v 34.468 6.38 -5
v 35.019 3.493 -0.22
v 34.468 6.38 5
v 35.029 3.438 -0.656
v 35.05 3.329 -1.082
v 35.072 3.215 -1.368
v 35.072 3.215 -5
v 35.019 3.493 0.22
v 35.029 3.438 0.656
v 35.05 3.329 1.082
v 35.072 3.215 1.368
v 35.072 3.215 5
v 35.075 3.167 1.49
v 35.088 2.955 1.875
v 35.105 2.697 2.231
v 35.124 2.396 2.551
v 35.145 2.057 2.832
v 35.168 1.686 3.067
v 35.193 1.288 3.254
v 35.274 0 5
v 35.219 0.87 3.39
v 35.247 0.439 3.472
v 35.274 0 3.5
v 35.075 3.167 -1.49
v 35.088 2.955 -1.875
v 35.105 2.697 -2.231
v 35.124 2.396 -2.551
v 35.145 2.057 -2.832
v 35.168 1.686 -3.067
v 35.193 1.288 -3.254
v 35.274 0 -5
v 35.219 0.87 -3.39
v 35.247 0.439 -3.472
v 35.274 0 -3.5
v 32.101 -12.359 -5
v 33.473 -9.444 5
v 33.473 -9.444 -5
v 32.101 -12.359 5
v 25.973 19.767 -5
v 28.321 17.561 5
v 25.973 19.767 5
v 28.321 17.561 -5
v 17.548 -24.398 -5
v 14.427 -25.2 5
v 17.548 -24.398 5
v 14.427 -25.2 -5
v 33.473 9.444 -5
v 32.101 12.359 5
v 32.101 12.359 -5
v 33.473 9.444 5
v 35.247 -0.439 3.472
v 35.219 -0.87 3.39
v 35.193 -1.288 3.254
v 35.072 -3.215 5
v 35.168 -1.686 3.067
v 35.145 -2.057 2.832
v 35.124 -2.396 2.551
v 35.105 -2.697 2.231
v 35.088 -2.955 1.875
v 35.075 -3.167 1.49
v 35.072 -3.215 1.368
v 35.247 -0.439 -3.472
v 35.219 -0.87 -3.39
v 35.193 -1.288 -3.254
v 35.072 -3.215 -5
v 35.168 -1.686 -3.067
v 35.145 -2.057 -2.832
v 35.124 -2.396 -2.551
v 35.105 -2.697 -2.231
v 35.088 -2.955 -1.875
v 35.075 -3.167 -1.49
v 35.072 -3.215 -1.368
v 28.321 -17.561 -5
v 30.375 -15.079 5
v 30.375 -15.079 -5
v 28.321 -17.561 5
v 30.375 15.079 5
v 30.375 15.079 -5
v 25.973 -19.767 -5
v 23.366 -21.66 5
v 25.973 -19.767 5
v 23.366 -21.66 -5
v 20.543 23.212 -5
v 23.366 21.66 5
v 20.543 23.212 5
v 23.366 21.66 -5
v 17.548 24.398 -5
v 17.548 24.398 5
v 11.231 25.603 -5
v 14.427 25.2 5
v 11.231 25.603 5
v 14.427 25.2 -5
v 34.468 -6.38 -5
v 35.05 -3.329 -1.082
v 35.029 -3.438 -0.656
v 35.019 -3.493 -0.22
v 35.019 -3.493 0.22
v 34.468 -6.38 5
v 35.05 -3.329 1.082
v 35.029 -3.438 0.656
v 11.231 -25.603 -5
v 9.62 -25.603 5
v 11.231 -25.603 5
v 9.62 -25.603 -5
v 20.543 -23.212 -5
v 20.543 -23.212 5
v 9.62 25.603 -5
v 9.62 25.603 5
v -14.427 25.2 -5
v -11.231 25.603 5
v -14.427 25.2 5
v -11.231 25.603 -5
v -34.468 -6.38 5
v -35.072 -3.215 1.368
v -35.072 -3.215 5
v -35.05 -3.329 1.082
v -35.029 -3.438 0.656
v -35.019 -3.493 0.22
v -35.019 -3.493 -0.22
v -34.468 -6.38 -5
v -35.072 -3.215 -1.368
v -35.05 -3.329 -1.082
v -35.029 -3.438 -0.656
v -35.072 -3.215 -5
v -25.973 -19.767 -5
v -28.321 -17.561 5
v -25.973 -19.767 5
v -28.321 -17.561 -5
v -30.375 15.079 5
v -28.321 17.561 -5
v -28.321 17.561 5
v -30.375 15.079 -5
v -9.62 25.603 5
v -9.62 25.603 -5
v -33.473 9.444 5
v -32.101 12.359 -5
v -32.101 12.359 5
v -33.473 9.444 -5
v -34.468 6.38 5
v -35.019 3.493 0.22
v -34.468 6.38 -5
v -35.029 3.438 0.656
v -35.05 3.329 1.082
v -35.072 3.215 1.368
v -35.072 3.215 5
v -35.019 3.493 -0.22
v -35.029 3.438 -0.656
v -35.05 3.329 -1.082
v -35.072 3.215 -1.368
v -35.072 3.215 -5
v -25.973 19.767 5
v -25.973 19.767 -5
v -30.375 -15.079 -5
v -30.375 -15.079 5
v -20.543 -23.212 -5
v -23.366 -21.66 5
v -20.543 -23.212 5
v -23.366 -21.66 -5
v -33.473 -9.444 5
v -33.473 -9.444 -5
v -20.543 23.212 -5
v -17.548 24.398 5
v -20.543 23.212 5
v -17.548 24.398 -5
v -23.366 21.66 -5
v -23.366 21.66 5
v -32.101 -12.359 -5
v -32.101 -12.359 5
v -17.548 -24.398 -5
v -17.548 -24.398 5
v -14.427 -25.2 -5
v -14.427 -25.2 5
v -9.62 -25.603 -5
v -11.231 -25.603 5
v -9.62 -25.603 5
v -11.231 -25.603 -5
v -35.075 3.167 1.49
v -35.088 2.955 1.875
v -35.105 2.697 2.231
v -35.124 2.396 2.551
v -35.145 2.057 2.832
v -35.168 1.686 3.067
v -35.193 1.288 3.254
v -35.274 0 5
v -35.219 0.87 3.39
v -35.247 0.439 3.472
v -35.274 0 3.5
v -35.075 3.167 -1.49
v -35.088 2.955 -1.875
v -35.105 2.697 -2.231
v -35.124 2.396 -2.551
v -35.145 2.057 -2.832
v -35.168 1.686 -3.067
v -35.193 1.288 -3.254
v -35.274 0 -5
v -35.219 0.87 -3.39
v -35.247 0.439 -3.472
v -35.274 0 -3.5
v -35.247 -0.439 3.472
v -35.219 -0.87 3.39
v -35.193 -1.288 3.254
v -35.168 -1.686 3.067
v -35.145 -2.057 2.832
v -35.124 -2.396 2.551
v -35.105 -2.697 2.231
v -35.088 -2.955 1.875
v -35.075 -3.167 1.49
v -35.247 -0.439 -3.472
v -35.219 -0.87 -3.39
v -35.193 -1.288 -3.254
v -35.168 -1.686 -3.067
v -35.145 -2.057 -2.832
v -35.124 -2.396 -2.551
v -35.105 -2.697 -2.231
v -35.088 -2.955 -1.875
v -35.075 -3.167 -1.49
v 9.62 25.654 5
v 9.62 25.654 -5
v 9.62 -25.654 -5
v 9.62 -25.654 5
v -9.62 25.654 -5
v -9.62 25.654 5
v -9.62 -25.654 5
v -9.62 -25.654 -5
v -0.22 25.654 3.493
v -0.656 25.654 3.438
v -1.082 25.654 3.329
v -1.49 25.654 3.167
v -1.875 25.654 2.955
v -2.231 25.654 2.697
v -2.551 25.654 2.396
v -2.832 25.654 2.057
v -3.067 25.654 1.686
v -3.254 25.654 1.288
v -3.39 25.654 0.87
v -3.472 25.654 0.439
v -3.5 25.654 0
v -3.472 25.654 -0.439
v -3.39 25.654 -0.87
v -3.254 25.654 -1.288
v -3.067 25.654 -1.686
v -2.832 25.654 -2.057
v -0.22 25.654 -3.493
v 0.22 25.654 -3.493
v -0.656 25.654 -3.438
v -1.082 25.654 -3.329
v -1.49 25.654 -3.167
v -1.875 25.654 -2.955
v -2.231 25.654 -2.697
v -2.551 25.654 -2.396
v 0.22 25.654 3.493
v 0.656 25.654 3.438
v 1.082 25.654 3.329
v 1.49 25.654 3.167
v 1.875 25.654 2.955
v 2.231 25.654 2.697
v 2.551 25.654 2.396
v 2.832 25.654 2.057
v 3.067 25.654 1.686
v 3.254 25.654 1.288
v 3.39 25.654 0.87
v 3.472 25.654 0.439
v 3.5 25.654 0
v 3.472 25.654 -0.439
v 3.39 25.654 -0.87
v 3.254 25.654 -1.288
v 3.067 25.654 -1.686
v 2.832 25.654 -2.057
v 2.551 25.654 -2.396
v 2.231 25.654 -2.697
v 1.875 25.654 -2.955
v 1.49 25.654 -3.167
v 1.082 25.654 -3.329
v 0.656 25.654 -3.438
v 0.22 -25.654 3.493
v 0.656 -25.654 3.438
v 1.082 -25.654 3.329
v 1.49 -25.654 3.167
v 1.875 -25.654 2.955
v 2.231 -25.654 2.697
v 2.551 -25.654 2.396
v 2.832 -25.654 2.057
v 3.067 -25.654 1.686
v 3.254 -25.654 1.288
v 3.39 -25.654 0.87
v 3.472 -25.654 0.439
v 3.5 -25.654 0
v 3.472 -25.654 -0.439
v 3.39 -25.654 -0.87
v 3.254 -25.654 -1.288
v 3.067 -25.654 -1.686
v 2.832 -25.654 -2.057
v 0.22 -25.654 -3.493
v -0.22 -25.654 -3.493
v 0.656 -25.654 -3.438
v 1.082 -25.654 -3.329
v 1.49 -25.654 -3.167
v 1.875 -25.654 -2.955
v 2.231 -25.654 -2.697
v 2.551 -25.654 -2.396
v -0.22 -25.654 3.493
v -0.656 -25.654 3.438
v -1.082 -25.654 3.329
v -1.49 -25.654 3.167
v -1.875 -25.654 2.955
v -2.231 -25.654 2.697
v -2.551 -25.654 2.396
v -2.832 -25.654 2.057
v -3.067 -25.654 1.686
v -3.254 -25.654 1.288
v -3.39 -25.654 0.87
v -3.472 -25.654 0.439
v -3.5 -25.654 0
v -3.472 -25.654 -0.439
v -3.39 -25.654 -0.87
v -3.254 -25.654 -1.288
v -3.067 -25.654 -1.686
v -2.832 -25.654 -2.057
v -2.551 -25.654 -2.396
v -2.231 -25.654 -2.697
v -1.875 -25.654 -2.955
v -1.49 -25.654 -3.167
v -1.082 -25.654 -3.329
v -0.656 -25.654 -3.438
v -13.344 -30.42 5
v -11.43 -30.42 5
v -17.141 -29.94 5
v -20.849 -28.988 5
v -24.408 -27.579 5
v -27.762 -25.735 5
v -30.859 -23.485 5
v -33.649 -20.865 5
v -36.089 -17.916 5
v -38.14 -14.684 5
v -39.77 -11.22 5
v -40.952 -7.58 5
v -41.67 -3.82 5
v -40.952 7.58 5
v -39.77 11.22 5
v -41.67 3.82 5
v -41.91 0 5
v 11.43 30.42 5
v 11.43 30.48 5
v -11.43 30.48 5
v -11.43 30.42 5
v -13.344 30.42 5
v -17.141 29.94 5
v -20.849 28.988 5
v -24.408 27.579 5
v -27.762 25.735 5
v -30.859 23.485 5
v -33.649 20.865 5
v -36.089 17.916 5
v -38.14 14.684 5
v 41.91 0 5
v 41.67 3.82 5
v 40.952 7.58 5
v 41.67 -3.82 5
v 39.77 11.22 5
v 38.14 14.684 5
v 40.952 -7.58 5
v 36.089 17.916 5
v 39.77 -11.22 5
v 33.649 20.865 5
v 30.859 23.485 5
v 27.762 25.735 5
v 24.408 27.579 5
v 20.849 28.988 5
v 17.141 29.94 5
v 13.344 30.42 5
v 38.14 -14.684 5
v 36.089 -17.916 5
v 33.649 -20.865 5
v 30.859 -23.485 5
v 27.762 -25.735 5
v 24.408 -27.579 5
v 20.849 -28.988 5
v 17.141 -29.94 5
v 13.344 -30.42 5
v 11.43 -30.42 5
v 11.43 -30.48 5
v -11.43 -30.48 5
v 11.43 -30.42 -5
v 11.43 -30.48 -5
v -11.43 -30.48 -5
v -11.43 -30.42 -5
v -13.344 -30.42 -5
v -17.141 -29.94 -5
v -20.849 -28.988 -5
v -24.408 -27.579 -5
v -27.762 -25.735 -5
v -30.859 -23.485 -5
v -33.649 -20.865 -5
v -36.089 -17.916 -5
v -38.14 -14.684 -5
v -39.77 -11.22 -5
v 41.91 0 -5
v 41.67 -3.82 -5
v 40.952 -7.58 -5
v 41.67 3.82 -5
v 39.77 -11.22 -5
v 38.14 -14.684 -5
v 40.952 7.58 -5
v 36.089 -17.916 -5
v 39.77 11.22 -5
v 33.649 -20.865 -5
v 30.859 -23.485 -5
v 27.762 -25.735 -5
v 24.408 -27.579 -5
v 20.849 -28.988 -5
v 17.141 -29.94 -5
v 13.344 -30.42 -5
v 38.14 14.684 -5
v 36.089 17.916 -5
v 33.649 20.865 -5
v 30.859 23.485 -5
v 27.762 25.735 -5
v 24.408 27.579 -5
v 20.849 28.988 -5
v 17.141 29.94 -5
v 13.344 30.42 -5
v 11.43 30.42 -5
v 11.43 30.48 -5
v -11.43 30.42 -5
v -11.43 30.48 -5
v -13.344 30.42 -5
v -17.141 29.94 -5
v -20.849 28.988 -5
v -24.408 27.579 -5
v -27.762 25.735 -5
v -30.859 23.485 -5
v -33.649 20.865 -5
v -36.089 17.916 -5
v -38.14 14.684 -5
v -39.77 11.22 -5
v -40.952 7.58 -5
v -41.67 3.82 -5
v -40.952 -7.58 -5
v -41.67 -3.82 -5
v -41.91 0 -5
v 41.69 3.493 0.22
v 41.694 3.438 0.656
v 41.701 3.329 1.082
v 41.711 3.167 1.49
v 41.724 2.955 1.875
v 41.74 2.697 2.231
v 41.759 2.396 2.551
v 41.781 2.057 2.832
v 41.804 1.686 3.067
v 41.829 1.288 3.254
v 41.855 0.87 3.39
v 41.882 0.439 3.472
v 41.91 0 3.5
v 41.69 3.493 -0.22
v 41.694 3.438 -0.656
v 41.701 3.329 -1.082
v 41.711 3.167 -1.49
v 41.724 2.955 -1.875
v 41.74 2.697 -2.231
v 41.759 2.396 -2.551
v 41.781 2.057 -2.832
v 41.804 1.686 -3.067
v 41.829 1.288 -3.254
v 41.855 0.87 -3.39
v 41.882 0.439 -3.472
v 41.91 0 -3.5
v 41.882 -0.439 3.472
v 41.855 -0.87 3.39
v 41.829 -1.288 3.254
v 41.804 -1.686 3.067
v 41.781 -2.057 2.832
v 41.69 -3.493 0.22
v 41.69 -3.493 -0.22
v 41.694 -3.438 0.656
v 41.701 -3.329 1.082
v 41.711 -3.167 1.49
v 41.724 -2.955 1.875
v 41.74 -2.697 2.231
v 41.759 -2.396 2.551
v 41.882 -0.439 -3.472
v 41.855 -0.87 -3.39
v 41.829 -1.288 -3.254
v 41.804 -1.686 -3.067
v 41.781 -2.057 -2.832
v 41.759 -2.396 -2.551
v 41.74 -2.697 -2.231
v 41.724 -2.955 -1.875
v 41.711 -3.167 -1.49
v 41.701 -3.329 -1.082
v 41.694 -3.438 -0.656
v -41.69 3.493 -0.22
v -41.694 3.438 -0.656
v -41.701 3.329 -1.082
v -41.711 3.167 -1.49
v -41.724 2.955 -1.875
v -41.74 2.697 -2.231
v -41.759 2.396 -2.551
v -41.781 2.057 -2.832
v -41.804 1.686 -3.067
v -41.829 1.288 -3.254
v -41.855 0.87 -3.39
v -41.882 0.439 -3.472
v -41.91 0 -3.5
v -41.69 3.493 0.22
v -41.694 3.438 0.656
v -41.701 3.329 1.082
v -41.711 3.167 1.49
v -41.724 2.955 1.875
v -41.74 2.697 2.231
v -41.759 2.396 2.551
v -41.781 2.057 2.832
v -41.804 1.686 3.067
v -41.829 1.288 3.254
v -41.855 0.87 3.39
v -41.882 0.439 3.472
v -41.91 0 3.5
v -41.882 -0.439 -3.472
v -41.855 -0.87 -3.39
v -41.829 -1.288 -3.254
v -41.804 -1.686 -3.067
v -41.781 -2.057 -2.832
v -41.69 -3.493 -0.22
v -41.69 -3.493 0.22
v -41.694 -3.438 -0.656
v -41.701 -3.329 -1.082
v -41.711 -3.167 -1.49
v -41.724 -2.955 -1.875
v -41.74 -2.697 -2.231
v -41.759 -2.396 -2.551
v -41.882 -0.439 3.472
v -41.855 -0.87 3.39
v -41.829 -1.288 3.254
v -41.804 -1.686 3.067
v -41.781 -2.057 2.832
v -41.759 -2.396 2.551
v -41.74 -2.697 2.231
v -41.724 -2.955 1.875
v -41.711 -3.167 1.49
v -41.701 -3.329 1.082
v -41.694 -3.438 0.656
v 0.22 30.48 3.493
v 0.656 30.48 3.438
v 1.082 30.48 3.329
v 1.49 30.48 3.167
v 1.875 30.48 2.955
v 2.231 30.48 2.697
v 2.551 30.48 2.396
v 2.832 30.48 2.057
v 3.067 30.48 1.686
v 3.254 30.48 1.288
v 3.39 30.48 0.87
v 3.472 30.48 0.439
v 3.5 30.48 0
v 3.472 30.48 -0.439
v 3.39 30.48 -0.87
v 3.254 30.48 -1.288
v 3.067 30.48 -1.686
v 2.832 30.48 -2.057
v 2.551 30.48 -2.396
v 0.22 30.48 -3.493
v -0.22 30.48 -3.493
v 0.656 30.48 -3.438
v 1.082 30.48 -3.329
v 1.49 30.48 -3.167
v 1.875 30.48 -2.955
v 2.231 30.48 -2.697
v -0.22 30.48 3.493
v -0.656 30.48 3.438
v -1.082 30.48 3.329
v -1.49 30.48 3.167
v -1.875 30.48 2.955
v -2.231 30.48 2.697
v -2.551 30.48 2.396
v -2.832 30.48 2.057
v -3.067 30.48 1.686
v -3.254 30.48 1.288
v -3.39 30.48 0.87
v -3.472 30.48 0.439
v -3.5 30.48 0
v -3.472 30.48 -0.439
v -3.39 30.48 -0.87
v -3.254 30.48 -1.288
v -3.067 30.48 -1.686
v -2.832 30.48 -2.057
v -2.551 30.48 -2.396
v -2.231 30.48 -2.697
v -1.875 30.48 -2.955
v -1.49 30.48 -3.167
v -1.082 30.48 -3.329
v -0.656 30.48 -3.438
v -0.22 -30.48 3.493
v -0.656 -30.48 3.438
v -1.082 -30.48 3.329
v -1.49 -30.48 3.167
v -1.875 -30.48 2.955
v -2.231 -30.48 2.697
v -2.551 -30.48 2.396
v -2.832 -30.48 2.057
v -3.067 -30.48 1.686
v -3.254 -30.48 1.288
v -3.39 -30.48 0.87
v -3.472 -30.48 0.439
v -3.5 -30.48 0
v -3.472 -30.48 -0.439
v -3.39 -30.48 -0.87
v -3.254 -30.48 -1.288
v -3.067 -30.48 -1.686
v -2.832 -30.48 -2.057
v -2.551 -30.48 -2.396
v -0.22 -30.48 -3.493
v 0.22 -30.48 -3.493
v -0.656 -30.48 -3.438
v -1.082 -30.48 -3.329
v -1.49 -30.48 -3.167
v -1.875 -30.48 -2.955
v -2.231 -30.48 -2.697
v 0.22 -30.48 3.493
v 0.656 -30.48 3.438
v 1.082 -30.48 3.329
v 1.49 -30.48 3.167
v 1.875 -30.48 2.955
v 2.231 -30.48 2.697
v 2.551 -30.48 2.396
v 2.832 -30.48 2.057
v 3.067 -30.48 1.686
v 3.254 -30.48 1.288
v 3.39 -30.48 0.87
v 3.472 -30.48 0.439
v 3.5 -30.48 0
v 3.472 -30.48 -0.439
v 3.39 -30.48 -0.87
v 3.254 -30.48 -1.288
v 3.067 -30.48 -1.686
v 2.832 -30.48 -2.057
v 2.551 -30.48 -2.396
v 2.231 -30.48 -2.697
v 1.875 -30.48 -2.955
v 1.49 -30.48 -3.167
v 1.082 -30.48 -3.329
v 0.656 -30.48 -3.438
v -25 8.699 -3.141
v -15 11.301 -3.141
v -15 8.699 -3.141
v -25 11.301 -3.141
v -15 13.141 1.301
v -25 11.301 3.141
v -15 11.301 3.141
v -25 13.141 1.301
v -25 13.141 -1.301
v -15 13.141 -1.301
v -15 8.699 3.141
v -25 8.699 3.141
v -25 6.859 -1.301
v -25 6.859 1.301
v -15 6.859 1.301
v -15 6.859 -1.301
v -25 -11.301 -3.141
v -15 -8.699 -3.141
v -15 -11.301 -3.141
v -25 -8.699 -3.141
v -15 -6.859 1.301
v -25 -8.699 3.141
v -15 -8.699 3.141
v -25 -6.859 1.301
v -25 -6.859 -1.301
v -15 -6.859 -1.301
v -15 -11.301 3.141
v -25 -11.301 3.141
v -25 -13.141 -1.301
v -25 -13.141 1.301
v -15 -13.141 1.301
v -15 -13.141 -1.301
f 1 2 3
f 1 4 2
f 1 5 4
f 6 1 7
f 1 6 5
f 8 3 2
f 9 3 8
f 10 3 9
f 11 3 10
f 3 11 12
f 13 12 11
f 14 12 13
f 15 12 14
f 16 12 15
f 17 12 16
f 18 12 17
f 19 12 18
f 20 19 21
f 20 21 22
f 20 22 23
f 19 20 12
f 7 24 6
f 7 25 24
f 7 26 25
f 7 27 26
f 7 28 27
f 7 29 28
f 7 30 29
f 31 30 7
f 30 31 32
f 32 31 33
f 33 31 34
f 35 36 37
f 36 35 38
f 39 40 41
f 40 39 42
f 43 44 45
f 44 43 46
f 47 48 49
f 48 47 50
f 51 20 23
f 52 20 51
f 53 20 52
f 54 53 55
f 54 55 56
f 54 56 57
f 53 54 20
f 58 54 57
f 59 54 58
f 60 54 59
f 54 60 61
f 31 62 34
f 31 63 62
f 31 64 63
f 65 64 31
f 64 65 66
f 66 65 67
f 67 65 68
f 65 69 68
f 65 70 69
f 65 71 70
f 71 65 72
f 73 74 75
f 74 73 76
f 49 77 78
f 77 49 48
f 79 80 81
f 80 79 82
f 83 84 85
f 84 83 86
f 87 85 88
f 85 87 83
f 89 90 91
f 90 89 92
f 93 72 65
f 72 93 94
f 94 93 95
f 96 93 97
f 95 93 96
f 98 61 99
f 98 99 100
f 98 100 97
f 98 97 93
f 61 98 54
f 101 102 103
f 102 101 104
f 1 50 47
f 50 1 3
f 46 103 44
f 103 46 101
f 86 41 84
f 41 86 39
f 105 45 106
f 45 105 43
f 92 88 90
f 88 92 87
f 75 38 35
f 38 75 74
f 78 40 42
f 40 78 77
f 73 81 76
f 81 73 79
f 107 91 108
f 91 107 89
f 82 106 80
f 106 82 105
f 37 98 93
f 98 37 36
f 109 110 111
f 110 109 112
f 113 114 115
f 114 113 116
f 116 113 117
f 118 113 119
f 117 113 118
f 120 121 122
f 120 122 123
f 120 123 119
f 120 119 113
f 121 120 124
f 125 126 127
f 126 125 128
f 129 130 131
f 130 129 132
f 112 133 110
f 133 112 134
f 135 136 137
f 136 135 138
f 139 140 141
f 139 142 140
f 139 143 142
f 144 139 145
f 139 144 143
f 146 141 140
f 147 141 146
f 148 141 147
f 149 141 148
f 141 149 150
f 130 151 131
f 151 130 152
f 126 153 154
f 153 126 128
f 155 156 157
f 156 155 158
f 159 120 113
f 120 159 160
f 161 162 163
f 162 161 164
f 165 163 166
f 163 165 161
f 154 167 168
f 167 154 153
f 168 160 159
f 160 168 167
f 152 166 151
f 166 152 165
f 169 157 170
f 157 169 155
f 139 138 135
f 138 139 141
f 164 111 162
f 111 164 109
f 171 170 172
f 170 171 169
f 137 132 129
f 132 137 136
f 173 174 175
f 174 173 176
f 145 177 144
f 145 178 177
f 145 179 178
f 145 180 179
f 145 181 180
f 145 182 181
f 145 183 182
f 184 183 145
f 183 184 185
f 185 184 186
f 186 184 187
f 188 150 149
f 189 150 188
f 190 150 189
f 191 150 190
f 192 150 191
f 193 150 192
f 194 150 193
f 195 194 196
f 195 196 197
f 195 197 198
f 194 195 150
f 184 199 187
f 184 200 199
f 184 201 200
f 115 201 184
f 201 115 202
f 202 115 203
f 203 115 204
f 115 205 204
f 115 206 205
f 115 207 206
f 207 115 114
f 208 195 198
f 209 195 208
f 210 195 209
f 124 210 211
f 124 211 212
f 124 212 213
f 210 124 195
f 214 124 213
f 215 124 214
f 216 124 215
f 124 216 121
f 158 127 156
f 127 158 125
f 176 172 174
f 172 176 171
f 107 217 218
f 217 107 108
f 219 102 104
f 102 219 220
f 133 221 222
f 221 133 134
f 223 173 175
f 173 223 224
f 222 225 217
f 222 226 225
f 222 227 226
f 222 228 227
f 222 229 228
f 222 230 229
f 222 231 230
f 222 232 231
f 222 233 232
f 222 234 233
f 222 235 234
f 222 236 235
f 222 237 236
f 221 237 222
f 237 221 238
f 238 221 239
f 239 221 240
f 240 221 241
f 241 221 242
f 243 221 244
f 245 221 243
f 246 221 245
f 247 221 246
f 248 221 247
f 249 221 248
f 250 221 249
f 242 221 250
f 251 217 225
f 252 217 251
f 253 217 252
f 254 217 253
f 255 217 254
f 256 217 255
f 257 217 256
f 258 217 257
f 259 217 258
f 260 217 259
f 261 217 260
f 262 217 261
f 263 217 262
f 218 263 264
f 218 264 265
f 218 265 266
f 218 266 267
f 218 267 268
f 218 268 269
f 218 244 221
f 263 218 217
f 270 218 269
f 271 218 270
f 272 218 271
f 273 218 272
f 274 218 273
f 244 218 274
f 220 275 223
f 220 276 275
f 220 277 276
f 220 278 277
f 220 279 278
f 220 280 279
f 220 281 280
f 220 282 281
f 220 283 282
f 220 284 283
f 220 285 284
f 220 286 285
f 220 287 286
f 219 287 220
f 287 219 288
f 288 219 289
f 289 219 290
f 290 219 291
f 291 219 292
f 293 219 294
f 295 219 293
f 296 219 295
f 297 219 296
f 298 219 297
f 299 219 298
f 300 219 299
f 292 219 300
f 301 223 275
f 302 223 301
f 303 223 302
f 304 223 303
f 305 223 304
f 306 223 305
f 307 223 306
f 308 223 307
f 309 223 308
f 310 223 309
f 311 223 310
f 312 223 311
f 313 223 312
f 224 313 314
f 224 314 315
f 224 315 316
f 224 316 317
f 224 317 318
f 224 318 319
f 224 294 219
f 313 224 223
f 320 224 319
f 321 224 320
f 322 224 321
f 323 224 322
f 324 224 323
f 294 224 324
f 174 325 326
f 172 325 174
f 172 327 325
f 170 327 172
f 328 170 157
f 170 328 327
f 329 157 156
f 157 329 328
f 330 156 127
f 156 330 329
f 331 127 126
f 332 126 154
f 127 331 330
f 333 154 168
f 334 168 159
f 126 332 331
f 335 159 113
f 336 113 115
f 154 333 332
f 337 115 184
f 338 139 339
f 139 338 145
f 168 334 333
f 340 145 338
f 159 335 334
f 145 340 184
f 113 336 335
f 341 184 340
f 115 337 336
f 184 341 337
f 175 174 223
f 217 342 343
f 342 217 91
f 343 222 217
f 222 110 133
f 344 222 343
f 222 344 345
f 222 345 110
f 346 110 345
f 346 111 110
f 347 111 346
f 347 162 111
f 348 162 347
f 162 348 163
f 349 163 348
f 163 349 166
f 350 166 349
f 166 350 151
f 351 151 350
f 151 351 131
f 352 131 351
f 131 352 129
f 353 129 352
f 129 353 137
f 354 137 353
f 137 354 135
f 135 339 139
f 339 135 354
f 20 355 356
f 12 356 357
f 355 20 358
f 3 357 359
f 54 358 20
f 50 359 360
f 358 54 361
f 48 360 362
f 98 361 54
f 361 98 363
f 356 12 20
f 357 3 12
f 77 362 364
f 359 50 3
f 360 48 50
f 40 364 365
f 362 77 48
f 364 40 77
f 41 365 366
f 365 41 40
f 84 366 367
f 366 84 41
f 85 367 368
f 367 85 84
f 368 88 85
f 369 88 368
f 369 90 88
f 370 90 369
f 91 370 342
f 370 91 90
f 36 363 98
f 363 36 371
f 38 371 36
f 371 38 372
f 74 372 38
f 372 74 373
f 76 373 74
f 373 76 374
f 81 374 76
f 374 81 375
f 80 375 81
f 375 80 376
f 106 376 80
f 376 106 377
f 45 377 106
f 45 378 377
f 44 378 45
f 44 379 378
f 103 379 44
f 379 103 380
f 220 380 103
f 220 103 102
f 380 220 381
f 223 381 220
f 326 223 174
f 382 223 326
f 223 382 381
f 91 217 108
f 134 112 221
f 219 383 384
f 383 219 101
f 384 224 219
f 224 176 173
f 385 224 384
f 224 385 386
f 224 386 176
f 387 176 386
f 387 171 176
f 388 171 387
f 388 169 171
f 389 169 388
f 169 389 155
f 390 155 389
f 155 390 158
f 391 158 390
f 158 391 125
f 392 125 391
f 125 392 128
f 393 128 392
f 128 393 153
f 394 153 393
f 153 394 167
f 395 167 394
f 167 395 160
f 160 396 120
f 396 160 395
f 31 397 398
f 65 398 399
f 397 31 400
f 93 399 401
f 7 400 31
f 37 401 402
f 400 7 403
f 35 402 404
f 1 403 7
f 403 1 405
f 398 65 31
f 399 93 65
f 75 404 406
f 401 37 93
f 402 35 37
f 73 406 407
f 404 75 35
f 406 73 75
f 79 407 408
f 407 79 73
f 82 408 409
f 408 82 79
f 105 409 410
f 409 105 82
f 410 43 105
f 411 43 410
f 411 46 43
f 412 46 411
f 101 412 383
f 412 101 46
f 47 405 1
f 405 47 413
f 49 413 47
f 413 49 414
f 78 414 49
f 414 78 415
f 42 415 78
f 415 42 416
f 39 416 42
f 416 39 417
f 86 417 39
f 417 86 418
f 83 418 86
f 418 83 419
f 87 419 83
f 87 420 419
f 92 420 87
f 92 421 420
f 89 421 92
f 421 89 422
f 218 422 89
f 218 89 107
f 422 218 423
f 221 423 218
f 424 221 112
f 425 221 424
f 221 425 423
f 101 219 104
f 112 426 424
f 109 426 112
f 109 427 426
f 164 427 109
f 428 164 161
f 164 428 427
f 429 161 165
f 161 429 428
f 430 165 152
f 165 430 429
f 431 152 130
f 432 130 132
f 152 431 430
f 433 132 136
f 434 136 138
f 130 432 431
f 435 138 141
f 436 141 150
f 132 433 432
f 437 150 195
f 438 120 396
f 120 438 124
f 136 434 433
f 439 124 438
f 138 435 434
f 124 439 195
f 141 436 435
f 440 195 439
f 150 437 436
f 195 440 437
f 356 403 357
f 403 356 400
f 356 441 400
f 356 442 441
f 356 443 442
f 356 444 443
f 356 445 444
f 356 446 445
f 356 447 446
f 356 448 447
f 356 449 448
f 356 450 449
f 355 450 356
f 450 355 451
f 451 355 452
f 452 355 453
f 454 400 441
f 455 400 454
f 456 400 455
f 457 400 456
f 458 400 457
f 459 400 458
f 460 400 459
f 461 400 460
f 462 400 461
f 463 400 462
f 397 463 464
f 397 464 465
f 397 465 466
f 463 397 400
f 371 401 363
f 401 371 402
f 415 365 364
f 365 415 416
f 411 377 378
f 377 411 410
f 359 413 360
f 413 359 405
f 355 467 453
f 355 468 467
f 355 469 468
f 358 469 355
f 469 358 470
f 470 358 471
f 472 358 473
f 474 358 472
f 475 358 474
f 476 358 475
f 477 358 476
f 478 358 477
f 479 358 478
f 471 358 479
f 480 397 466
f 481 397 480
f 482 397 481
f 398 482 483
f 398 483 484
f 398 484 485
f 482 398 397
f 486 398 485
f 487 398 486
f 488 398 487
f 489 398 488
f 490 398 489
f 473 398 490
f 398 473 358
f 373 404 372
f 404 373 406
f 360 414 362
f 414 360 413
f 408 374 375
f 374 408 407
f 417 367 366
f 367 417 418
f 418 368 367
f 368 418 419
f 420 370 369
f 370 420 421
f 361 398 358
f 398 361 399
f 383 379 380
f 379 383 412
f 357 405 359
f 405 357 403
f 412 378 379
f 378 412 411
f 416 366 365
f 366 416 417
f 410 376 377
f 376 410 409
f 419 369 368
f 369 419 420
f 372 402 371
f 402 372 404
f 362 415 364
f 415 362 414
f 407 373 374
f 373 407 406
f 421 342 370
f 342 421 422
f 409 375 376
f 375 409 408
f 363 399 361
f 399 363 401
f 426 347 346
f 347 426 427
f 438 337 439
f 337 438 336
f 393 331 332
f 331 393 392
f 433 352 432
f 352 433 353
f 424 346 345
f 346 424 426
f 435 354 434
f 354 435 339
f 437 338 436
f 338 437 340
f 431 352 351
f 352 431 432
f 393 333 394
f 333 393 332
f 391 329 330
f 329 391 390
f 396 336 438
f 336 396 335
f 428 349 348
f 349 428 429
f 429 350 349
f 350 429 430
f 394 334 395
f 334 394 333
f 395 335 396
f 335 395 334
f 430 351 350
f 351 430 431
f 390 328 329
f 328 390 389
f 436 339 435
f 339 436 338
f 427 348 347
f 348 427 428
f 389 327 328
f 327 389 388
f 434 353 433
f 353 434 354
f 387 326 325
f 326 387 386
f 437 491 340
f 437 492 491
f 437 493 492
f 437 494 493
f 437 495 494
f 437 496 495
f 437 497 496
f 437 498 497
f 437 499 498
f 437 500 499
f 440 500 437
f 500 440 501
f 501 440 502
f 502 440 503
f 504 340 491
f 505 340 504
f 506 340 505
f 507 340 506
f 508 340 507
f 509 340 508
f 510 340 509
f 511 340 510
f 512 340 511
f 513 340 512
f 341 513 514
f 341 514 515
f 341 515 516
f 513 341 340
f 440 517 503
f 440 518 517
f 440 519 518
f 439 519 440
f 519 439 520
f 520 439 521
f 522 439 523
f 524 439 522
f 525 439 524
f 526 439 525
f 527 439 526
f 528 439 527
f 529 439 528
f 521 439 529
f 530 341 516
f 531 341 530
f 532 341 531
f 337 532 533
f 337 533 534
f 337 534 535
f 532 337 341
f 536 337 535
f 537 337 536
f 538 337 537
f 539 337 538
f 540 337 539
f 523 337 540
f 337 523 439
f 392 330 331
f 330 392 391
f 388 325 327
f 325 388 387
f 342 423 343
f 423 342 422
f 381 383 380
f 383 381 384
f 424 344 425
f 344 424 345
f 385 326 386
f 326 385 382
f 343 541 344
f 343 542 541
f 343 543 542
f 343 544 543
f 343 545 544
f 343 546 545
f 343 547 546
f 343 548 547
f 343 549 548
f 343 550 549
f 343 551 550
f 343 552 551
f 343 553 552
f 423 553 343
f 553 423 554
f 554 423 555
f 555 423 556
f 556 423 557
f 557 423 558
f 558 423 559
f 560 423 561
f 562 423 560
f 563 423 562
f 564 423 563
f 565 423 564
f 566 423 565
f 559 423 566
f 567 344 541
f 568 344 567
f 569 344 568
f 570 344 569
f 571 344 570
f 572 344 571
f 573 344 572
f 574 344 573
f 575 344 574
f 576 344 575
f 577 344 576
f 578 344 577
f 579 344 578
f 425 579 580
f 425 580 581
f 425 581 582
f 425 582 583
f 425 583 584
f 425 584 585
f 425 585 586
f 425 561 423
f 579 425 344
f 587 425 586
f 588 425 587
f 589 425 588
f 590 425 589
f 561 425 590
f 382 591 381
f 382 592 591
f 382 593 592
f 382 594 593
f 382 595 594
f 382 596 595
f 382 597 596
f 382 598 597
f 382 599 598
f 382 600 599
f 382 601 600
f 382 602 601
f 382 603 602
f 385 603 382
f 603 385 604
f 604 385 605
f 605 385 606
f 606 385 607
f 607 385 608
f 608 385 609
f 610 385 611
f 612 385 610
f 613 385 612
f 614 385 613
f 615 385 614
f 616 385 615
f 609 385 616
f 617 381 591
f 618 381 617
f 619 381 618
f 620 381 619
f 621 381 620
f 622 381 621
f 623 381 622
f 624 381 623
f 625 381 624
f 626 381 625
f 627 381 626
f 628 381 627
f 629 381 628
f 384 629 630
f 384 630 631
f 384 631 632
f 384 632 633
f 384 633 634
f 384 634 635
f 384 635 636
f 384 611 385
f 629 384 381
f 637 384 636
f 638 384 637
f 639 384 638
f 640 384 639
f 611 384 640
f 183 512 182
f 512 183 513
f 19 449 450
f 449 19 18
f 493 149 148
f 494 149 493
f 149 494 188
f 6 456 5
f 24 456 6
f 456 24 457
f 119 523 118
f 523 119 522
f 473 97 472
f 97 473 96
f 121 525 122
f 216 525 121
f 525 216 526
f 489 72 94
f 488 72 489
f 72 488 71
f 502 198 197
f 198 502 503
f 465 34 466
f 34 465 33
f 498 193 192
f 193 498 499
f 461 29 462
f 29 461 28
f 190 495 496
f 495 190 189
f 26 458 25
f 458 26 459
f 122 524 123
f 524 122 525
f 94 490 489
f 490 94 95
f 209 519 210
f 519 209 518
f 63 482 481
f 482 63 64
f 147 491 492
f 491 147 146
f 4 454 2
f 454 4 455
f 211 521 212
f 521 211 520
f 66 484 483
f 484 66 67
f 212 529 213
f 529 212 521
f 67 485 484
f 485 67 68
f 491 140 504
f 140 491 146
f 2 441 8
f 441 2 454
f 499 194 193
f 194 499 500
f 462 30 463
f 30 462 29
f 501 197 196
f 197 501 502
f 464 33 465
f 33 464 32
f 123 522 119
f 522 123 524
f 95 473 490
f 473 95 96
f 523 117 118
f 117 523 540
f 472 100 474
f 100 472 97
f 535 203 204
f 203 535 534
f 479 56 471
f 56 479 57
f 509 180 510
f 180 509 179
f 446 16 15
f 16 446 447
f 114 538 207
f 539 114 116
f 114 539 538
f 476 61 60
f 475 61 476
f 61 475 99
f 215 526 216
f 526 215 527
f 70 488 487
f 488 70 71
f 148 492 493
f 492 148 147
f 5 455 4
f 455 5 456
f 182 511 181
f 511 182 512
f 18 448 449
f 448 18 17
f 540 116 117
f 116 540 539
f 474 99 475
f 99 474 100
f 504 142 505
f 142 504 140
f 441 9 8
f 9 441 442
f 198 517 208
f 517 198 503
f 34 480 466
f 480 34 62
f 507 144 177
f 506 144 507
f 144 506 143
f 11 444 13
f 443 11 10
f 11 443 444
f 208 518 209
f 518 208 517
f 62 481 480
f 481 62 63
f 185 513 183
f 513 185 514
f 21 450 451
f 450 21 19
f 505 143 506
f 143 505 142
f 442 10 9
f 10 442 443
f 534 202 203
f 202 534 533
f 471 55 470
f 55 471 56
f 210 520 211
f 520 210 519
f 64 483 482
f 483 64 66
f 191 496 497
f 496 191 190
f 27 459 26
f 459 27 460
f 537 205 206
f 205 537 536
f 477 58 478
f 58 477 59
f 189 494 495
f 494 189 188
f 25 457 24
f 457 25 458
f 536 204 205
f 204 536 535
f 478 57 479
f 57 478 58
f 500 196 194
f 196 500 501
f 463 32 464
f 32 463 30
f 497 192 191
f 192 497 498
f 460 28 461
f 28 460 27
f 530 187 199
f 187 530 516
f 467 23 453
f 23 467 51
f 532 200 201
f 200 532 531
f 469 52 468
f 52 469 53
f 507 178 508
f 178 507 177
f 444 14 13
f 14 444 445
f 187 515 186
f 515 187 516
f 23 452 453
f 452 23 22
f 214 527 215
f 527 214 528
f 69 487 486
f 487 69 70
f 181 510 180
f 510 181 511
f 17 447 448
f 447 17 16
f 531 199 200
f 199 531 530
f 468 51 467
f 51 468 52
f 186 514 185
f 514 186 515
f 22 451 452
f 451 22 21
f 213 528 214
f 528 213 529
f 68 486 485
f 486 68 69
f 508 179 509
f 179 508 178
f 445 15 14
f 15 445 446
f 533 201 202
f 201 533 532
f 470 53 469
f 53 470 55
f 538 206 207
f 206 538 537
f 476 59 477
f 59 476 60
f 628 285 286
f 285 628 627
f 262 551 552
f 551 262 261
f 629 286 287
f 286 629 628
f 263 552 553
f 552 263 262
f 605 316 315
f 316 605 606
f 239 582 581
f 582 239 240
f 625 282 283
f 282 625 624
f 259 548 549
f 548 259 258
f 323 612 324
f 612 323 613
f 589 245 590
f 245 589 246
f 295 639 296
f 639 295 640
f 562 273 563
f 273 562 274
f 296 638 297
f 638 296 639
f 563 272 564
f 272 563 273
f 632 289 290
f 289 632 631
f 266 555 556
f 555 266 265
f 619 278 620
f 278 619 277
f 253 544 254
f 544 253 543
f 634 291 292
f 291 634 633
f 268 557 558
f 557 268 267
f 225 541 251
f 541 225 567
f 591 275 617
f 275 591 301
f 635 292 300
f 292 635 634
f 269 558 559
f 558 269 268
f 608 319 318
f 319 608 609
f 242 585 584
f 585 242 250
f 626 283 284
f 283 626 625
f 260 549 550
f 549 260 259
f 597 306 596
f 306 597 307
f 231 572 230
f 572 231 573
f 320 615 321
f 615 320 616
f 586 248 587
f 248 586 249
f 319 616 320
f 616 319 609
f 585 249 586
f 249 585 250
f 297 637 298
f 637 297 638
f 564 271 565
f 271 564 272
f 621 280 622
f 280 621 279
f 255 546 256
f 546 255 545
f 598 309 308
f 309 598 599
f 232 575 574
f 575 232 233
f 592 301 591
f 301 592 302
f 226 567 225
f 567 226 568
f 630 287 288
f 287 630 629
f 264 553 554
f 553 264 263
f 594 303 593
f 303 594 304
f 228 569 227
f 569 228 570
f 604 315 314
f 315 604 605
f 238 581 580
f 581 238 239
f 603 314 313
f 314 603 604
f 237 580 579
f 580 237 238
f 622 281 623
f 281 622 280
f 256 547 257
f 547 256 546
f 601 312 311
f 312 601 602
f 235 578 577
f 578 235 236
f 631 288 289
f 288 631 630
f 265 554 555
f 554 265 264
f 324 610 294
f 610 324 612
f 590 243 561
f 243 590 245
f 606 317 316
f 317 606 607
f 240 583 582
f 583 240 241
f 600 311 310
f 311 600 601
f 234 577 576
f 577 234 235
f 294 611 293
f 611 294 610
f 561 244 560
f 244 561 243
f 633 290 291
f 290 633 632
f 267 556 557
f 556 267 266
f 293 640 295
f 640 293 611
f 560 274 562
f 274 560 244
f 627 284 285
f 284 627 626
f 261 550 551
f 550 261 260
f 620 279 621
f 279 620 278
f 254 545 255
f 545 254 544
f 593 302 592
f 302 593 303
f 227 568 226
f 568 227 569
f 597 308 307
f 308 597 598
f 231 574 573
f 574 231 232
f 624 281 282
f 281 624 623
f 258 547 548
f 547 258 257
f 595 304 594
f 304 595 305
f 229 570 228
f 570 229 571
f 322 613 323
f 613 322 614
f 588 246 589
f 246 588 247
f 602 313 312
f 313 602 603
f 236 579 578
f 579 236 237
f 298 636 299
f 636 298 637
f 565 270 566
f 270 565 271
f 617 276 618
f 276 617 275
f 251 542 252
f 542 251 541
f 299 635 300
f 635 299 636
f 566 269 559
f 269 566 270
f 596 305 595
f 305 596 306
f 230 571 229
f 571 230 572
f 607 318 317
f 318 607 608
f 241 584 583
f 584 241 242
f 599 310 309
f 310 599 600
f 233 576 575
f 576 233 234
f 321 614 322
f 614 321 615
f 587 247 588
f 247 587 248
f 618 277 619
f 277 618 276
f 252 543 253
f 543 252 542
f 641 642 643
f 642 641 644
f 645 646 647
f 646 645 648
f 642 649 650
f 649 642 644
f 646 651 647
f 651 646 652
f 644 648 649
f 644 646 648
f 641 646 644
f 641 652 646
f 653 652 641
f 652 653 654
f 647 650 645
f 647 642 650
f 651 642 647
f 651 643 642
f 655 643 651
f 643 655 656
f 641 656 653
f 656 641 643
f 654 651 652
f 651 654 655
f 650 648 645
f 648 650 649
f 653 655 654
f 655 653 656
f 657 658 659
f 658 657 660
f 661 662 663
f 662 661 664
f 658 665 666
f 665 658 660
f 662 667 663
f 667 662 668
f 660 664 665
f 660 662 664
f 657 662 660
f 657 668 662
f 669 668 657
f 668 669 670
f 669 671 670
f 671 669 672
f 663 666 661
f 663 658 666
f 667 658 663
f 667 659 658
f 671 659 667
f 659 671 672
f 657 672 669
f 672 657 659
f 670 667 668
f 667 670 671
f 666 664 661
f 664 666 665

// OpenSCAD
/* [PEGS] */
numberPegs = 2; //[0, 1, 2, 3, 4]

// Container is exactly: 2.0" x 2.75"

difference()
{
 ring();
 holes();
}

if (numberPegs > 3)
{ 
    translate([20, 10, 0]) peg();
}
if (numberPegs > 2)
{ 
    translate([20, -10, 0]) peg();
}
if (numberPegs > 1)
{ 
    translate([-20, 10, 0]) peg();
}
if (numberPegs > 0)
{ 
    translate([-20, -10, 0]) peg();
}


module baseCylinder()
{
    cylinder(d=mm(2), h=20, center=true, $fn=50);
}

module container()
{
 translate([mm(.75/2),0,0]) baseCylinder();
 translate([-mm(.75/2),0,0]) baseCylinder();
 cube([mm(0.75), mm(2), 20], center=true);    
}

module ring()
{
intersection()
{
 difference()
 {
  cube([mm(3.5),mm(2.5),10], center=true);
  // slight upscale needed for tolerance. Increase for looser fit, decrease for tighter fit
  scale([1.01,1.01,1]) container();
 }
  // sets the thickness of the ring
  scale([1.2,1.2,1.1]) container(); 
}
}

module holes()
{
 rotate ([0,90,0]) hole();
 rotate ([90,0,0]) hole();  
}

module hole()
{
    cylinder(d=7, h=300, $fn=50, center=true);    
}

module peg()
{
  rotate([22.5,0,0]) rotate ([0,90,0]) cylinder(d=6.8, h=10, $fn=8, center=true);  
}


// converts x from inches to mm
function mm(x) = 25.4*x;
